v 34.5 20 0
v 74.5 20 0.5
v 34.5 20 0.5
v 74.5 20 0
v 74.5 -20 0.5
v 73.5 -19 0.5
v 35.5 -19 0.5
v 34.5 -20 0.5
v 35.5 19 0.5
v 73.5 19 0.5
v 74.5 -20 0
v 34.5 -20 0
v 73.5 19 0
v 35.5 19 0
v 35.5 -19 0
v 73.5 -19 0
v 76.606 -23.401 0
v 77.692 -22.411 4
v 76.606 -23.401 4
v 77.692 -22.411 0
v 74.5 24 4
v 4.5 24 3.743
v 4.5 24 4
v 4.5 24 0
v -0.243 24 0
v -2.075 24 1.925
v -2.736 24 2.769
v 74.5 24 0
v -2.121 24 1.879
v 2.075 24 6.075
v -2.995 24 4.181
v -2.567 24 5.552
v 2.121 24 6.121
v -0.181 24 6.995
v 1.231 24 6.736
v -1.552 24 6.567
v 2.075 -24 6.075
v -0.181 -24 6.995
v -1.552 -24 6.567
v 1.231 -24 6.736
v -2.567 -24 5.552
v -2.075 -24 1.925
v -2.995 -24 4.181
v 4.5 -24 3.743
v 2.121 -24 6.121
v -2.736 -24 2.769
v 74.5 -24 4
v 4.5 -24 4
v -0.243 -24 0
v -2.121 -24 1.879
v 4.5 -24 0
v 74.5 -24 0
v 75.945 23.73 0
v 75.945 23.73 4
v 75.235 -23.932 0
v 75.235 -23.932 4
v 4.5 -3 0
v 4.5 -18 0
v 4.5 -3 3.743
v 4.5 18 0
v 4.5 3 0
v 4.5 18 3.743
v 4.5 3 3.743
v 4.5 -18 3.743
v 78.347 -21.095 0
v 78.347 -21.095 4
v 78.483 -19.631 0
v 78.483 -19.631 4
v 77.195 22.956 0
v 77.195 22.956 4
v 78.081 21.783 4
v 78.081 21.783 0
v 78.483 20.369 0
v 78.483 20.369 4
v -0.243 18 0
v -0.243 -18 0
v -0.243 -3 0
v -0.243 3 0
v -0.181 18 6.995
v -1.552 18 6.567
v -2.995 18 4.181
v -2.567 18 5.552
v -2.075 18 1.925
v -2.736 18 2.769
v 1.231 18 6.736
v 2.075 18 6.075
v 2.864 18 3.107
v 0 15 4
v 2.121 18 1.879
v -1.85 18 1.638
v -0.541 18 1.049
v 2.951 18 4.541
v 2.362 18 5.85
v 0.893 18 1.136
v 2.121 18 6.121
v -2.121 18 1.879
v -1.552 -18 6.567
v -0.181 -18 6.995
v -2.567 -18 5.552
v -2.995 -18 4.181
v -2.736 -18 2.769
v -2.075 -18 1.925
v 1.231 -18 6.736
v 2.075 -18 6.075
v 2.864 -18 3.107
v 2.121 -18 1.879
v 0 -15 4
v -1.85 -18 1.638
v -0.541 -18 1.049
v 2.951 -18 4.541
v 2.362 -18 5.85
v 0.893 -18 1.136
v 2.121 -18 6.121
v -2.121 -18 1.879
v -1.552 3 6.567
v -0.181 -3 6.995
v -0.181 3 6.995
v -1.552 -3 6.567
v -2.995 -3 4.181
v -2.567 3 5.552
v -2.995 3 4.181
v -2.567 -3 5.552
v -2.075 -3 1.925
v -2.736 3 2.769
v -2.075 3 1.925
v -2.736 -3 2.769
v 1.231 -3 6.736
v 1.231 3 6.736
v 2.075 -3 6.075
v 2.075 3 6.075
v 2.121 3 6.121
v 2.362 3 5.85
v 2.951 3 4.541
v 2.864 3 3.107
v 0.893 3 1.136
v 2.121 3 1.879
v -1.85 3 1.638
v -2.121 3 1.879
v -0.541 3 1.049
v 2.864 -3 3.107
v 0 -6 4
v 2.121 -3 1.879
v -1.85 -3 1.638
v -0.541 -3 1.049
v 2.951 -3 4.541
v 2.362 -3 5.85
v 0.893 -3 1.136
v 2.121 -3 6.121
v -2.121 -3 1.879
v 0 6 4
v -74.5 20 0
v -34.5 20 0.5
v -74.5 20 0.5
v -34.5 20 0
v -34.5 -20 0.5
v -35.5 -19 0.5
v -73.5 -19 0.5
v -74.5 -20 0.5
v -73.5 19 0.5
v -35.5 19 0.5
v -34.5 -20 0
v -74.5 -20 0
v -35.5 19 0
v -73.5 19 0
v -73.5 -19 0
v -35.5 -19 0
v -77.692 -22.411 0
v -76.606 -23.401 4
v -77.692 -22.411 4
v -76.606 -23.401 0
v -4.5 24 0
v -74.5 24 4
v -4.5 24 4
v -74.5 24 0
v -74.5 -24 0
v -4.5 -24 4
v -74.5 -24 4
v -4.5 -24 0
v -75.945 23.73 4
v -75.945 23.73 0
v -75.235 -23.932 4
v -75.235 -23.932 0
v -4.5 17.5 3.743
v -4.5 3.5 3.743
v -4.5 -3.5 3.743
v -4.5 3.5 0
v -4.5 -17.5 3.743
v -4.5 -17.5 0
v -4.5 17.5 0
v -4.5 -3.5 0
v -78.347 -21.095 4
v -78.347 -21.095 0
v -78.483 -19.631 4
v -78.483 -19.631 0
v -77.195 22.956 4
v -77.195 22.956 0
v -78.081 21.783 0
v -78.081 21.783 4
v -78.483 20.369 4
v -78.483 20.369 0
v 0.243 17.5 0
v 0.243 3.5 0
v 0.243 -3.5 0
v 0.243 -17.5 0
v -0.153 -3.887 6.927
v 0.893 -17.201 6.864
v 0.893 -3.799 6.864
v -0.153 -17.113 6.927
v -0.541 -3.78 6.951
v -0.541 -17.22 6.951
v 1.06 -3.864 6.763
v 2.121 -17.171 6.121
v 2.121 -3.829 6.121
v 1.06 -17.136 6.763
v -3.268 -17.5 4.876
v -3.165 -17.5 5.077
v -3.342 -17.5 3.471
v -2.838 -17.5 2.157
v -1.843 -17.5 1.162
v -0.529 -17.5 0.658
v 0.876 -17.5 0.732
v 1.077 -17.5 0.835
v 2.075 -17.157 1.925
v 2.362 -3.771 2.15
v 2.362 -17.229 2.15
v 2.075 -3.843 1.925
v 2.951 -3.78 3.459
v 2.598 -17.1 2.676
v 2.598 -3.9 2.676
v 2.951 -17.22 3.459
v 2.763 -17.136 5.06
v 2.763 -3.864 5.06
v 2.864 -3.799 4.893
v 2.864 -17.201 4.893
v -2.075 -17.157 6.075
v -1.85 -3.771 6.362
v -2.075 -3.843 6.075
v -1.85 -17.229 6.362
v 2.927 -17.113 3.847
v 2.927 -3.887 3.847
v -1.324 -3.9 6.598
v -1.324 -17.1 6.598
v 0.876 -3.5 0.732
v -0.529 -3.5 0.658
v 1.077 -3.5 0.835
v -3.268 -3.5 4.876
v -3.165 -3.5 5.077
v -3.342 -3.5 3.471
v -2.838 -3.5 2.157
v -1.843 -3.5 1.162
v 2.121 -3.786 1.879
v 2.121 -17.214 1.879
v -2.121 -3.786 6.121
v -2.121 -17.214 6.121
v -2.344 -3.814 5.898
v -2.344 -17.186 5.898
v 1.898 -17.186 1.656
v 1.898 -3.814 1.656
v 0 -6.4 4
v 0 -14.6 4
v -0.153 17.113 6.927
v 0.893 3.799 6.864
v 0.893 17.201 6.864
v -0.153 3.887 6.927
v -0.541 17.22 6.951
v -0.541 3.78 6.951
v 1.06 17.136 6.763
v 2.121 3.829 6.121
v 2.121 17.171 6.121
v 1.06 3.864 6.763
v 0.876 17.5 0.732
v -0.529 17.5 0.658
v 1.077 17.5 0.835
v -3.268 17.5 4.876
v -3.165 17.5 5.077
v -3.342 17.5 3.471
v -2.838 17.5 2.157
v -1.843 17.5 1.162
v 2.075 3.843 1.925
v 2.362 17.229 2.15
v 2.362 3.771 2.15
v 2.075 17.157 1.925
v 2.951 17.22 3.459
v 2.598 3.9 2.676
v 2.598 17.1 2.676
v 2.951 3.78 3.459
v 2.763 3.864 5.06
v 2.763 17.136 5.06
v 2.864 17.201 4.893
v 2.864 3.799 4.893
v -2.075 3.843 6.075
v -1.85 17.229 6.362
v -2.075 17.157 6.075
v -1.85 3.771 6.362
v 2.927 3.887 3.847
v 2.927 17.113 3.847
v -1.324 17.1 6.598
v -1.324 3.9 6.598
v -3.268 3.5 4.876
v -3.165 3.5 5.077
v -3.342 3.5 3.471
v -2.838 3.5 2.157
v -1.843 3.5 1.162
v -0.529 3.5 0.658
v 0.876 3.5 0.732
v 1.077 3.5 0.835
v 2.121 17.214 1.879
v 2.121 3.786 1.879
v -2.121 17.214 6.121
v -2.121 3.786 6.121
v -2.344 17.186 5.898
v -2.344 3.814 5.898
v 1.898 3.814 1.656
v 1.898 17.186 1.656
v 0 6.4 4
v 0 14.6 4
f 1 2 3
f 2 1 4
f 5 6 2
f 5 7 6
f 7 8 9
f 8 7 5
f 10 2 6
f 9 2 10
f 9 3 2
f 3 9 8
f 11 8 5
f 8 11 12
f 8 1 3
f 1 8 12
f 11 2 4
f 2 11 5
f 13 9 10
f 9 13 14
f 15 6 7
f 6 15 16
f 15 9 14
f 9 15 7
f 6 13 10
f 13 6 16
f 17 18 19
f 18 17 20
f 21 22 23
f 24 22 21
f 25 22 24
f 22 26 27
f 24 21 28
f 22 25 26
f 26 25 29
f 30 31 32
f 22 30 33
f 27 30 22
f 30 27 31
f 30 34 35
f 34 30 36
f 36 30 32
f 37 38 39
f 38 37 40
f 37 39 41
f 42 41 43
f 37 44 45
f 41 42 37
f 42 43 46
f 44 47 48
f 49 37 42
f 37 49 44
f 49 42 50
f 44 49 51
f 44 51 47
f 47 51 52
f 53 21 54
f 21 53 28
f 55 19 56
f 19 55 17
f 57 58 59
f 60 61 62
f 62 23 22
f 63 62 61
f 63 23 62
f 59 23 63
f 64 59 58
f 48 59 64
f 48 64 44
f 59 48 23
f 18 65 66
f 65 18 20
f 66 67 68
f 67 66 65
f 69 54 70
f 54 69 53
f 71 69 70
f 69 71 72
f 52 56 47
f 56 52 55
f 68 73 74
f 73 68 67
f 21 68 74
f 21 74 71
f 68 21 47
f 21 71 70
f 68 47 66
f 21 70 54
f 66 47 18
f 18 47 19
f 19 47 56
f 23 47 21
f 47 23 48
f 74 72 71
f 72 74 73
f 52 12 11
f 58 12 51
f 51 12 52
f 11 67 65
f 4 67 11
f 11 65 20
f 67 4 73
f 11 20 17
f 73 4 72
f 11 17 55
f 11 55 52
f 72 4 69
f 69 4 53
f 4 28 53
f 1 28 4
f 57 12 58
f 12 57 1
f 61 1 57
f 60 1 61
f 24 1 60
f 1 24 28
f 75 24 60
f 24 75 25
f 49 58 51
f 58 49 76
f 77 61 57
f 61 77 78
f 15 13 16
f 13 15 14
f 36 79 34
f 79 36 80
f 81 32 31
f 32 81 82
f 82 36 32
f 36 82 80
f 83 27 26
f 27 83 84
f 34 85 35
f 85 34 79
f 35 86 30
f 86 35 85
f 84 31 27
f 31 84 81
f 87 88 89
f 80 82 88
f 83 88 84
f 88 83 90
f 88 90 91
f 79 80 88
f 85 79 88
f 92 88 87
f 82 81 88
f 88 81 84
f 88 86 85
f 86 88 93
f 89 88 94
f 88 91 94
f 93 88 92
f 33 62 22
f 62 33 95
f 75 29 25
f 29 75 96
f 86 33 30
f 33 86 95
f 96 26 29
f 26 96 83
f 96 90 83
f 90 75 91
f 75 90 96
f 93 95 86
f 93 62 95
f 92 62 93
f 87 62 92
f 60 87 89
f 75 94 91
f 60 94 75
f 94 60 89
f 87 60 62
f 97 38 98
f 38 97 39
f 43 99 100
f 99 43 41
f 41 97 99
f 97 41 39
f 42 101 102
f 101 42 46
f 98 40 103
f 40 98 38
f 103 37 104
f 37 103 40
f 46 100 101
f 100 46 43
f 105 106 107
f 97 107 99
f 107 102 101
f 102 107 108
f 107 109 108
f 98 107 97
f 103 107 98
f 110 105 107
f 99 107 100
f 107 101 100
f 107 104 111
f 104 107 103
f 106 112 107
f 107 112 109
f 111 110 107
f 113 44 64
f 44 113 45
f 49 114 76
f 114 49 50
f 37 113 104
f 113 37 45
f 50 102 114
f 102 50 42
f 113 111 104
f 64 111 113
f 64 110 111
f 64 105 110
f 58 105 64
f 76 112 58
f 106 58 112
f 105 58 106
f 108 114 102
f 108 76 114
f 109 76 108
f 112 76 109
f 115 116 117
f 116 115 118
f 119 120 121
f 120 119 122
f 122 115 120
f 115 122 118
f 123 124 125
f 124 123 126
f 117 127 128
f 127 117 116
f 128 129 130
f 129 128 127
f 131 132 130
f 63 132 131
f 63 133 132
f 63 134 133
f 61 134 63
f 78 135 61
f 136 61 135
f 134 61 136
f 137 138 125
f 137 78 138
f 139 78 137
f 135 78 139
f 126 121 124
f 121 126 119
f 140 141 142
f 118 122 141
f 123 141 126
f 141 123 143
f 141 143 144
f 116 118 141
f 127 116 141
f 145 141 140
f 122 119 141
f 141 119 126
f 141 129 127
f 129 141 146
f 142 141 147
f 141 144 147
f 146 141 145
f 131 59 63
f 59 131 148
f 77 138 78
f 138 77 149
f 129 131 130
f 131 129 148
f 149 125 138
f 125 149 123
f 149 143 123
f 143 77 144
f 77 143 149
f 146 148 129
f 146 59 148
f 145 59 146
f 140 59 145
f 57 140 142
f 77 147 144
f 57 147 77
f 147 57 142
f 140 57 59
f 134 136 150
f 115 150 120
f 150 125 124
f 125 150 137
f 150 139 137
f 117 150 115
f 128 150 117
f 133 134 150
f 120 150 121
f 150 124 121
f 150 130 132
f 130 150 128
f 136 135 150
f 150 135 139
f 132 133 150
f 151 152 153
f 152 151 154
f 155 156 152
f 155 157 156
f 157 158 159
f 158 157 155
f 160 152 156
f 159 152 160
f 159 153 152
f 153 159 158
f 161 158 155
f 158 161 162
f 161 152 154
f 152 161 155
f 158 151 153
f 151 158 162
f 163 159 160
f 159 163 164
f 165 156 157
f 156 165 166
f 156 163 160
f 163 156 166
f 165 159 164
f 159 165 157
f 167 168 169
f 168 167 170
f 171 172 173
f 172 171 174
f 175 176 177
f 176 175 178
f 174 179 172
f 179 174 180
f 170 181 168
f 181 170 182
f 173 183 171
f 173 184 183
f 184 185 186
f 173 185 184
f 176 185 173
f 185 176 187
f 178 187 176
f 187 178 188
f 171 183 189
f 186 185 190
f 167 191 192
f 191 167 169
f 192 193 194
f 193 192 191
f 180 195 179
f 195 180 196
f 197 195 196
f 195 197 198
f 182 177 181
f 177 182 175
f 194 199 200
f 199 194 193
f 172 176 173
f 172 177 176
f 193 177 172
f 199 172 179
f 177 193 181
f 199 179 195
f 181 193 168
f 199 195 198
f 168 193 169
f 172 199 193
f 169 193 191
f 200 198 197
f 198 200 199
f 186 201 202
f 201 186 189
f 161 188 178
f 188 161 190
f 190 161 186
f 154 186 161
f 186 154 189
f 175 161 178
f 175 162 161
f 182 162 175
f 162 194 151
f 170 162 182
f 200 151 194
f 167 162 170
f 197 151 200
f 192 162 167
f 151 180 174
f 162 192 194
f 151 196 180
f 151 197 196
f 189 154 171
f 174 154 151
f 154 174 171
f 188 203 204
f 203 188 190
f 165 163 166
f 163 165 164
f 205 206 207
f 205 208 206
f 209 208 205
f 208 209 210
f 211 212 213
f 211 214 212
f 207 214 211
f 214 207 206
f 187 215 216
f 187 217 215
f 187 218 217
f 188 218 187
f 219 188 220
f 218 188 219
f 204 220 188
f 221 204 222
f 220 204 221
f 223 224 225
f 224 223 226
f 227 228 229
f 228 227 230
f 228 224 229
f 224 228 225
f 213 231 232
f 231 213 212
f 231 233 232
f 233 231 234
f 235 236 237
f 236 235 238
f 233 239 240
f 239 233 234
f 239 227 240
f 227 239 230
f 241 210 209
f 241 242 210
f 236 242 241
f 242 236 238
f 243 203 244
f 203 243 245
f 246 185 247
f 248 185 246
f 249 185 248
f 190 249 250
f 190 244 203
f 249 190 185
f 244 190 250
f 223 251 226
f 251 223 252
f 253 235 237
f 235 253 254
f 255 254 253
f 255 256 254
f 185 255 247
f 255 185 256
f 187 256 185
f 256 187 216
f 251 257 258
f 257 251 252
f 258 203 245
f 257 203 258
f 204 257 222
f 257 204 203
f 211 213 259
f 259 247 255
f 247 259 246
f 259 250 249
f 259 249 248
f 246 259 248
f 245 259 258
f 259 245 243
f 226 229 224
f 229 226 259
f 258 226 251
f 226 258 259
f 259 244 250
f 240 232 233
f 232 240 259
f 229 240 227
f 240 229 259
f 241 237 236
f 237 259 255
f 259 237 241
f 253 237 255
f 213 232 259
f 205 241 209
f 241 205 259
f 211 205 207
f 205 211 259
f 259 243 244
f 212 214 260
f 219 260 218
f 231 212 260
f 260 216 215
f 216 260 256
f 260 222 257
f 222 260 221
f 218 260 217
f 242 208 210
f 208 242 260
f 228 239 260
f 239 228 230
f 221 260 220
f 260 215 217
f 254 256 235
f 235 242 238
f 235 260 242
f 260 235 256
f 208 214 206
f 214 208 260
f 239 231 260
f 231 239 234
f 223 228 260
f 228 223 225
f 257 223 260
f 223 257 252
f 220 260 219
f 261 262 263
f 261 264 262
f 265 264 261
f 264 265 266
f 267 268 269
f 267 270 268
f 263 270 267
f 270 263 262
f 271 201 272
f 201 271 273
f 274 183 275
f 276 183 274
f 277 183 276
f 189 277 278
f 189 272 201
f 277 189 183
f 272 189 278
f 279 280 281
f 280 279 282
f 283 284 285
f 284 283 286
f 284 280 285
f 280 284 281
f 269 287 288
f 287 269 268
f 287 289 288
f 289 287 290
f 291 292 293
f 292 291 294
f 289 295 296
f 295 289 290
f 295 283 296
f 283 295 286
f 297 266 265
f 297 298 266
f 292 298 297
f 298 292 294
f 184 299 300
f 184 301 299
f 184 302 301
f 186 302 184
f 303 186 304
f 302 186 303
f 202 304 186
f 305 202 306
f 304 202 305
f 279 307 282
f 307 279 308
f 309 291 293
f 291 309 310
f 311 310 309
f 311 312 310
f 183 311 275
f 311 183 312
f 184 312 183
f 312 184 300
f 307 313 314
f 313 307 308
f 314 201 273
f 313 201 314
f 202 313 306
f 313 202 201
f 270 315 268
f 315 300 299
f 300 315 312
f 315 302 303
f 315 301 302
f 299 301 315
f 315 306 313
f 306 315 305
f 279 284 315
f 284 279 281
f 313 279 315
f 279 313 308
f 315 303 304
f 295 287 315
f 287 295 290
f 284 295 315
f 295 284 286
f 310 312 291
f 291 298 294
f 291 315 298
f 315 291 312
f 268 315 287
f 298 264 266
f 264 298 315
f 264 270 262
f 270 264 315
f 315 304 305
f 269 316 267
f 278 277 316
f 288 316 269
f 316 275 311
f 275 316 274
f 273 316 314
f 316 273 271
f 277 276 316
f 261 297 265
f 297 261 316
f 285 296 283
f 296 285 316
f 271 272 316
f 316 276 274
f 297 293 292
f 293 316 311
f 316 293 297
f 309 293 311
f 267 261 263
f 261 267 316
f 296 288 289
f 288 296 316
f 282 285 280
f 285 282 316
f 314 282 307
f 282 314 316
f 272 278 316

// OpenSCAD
// [FL_INDEX: keywords="openscad, 3d_parametric, test, csg_solid" | COT="Parametric OpenSCAD design from 3DCodeverse"]
// Title: test

// preview[view:south, tilt:top]

/* [Global] */

// Load a 150x150 pixel image.(images will be stretched to fit) Simple, high contrast images work best. Make sure to click the Invert Colors checkbox!
image_file = "smile.dat"; // [image_surface:150x150]

// Where would you like the hinge in relation to your image?
hinge_placement = 1; // [1:top,2:left,3:bottom,4:right]

// What height would you like for the embossed area (mm)?
emboss_height = 1.5;

// How thick should the handle be (mm)?
handle_thickness = 2.5;

// How long should the handle be (mm, not less than 45)?
handle_length = 70;

/* [Hidden] */
$fa = 6;
$fs = 1.5;
image_width = 40;
image_length = 40;
image_padding = 4;

handle_width = image_width + image_padding*2;
handle_height = emboss_height+handle_thickness;
nub = 3; // hinge size
tol = 0.5; // spacing between hinge pieces

assembly();

module assembly() {
    stamp_top(90*hinge_placement);
    stamp_bottom(90*hinge_placement);   
}

module stamp_top(rot=90) {
    translate([1,0,0])
    union() {
        difference () {
            translate([handle_length + nub + tol, -handle_width/2, 0])
                rotate([0,0,90]) handle();
            translate([handle_length-image_length/2+nub+tol,0,handle_height]) 
                rotate([0,180,rot]) plate();
        }
    
        // hinge
        translate([-1,handle_width/2-2*nub,handle_height]) hinge_m();
        mirror([0,1,0]) translate([-1,handle_width/2-2*nub,handle_height]) hinge_m();
        translate([-1,-nub,handle_height]) hinge_m();
        mirror([0,1,0]) translate([-1,-nub,handle_height]) hinge_m();
    }
}

module stamp_bottom(rot=90) {
    translate([-1,0,0])
    union() {
        translate([-handle_length + image_length/2-nub-tol,0,handle_height]) 
            rotate([0,0,-rot]) plate();
        mirror([1,0,0]) translate([handle_length + nub + tol, -handle_width/2, 0]) 
            rotate([0,0,90]) handle();
        
        // hinge
        translate([1,-nub-tol,handle_height]) hinge_f();
        mirror([0,1,0]) translate([1,-nub-tol,handle_height]) hinge_f();
    }
}

module handle() {
    difference() {
        hull() {
            cube([handle_width, handle_length, handle_height]);
            translate([image_padding,0,0]) cylinder(r=image_padding, h=handle_height);
            translate([handle_width-image_padding,0,0]) cylinder(r=image_padding, h=handle_height);
        }
        guide();
    }

}

module guide() {
    translate([image_padding,0,-.5]) 
    difference() {
        cube([image_width, image_length, 1]);
        translate([1,1,-0.5]) cube([image_width-2, image_length-2, 2]);
    }
}

module hinge_m() {
    difference () {
    	rotate([0,45,0]) union(){
            translate([0,0,-nub]) cube ([nub*3,nub*2, nub*2]);
            rotate([90,0,0]) {
                translate([0,0,-2*nub]) cylinder(r=nub,h=2*nub);
    		    cylinder(r1=nub,r2=0,h=nub);
            }
    	}
        translate([-nub,-nub/2,-handle_height-nub*5]) cube([nub*5, nub*3, nub*5]);
    }
}

module hinge_f() {
    len = handle_width/2 - 3*nub - 2*tol;
    
    difference() {
        rotate([90,-45,0]) 
        difference() {
            union() {
                cylinder(r=nub, h=len);
                translate([-3*nub,-nub,0]) cube([nub*3,nub*2,len]);
            }
            translate([0,0,-0.1]) cylinder(r1=nub+tol,r2=0,h=nub);
            translate([0,0,len-nub+0.1]) cylinder(r1=0,r2=nub+tol,h=nub);
        }
        translate([-nub*4,-len-nub/2,-handle_height-nub*5]) cube([nub*5, len+nub, nub*5]);
    }
}

module plate() {
    scale([(image_width)/150,(image_length)/150,emboss_height])
        surface(file=image_file, center=true, convexity=5);
}
